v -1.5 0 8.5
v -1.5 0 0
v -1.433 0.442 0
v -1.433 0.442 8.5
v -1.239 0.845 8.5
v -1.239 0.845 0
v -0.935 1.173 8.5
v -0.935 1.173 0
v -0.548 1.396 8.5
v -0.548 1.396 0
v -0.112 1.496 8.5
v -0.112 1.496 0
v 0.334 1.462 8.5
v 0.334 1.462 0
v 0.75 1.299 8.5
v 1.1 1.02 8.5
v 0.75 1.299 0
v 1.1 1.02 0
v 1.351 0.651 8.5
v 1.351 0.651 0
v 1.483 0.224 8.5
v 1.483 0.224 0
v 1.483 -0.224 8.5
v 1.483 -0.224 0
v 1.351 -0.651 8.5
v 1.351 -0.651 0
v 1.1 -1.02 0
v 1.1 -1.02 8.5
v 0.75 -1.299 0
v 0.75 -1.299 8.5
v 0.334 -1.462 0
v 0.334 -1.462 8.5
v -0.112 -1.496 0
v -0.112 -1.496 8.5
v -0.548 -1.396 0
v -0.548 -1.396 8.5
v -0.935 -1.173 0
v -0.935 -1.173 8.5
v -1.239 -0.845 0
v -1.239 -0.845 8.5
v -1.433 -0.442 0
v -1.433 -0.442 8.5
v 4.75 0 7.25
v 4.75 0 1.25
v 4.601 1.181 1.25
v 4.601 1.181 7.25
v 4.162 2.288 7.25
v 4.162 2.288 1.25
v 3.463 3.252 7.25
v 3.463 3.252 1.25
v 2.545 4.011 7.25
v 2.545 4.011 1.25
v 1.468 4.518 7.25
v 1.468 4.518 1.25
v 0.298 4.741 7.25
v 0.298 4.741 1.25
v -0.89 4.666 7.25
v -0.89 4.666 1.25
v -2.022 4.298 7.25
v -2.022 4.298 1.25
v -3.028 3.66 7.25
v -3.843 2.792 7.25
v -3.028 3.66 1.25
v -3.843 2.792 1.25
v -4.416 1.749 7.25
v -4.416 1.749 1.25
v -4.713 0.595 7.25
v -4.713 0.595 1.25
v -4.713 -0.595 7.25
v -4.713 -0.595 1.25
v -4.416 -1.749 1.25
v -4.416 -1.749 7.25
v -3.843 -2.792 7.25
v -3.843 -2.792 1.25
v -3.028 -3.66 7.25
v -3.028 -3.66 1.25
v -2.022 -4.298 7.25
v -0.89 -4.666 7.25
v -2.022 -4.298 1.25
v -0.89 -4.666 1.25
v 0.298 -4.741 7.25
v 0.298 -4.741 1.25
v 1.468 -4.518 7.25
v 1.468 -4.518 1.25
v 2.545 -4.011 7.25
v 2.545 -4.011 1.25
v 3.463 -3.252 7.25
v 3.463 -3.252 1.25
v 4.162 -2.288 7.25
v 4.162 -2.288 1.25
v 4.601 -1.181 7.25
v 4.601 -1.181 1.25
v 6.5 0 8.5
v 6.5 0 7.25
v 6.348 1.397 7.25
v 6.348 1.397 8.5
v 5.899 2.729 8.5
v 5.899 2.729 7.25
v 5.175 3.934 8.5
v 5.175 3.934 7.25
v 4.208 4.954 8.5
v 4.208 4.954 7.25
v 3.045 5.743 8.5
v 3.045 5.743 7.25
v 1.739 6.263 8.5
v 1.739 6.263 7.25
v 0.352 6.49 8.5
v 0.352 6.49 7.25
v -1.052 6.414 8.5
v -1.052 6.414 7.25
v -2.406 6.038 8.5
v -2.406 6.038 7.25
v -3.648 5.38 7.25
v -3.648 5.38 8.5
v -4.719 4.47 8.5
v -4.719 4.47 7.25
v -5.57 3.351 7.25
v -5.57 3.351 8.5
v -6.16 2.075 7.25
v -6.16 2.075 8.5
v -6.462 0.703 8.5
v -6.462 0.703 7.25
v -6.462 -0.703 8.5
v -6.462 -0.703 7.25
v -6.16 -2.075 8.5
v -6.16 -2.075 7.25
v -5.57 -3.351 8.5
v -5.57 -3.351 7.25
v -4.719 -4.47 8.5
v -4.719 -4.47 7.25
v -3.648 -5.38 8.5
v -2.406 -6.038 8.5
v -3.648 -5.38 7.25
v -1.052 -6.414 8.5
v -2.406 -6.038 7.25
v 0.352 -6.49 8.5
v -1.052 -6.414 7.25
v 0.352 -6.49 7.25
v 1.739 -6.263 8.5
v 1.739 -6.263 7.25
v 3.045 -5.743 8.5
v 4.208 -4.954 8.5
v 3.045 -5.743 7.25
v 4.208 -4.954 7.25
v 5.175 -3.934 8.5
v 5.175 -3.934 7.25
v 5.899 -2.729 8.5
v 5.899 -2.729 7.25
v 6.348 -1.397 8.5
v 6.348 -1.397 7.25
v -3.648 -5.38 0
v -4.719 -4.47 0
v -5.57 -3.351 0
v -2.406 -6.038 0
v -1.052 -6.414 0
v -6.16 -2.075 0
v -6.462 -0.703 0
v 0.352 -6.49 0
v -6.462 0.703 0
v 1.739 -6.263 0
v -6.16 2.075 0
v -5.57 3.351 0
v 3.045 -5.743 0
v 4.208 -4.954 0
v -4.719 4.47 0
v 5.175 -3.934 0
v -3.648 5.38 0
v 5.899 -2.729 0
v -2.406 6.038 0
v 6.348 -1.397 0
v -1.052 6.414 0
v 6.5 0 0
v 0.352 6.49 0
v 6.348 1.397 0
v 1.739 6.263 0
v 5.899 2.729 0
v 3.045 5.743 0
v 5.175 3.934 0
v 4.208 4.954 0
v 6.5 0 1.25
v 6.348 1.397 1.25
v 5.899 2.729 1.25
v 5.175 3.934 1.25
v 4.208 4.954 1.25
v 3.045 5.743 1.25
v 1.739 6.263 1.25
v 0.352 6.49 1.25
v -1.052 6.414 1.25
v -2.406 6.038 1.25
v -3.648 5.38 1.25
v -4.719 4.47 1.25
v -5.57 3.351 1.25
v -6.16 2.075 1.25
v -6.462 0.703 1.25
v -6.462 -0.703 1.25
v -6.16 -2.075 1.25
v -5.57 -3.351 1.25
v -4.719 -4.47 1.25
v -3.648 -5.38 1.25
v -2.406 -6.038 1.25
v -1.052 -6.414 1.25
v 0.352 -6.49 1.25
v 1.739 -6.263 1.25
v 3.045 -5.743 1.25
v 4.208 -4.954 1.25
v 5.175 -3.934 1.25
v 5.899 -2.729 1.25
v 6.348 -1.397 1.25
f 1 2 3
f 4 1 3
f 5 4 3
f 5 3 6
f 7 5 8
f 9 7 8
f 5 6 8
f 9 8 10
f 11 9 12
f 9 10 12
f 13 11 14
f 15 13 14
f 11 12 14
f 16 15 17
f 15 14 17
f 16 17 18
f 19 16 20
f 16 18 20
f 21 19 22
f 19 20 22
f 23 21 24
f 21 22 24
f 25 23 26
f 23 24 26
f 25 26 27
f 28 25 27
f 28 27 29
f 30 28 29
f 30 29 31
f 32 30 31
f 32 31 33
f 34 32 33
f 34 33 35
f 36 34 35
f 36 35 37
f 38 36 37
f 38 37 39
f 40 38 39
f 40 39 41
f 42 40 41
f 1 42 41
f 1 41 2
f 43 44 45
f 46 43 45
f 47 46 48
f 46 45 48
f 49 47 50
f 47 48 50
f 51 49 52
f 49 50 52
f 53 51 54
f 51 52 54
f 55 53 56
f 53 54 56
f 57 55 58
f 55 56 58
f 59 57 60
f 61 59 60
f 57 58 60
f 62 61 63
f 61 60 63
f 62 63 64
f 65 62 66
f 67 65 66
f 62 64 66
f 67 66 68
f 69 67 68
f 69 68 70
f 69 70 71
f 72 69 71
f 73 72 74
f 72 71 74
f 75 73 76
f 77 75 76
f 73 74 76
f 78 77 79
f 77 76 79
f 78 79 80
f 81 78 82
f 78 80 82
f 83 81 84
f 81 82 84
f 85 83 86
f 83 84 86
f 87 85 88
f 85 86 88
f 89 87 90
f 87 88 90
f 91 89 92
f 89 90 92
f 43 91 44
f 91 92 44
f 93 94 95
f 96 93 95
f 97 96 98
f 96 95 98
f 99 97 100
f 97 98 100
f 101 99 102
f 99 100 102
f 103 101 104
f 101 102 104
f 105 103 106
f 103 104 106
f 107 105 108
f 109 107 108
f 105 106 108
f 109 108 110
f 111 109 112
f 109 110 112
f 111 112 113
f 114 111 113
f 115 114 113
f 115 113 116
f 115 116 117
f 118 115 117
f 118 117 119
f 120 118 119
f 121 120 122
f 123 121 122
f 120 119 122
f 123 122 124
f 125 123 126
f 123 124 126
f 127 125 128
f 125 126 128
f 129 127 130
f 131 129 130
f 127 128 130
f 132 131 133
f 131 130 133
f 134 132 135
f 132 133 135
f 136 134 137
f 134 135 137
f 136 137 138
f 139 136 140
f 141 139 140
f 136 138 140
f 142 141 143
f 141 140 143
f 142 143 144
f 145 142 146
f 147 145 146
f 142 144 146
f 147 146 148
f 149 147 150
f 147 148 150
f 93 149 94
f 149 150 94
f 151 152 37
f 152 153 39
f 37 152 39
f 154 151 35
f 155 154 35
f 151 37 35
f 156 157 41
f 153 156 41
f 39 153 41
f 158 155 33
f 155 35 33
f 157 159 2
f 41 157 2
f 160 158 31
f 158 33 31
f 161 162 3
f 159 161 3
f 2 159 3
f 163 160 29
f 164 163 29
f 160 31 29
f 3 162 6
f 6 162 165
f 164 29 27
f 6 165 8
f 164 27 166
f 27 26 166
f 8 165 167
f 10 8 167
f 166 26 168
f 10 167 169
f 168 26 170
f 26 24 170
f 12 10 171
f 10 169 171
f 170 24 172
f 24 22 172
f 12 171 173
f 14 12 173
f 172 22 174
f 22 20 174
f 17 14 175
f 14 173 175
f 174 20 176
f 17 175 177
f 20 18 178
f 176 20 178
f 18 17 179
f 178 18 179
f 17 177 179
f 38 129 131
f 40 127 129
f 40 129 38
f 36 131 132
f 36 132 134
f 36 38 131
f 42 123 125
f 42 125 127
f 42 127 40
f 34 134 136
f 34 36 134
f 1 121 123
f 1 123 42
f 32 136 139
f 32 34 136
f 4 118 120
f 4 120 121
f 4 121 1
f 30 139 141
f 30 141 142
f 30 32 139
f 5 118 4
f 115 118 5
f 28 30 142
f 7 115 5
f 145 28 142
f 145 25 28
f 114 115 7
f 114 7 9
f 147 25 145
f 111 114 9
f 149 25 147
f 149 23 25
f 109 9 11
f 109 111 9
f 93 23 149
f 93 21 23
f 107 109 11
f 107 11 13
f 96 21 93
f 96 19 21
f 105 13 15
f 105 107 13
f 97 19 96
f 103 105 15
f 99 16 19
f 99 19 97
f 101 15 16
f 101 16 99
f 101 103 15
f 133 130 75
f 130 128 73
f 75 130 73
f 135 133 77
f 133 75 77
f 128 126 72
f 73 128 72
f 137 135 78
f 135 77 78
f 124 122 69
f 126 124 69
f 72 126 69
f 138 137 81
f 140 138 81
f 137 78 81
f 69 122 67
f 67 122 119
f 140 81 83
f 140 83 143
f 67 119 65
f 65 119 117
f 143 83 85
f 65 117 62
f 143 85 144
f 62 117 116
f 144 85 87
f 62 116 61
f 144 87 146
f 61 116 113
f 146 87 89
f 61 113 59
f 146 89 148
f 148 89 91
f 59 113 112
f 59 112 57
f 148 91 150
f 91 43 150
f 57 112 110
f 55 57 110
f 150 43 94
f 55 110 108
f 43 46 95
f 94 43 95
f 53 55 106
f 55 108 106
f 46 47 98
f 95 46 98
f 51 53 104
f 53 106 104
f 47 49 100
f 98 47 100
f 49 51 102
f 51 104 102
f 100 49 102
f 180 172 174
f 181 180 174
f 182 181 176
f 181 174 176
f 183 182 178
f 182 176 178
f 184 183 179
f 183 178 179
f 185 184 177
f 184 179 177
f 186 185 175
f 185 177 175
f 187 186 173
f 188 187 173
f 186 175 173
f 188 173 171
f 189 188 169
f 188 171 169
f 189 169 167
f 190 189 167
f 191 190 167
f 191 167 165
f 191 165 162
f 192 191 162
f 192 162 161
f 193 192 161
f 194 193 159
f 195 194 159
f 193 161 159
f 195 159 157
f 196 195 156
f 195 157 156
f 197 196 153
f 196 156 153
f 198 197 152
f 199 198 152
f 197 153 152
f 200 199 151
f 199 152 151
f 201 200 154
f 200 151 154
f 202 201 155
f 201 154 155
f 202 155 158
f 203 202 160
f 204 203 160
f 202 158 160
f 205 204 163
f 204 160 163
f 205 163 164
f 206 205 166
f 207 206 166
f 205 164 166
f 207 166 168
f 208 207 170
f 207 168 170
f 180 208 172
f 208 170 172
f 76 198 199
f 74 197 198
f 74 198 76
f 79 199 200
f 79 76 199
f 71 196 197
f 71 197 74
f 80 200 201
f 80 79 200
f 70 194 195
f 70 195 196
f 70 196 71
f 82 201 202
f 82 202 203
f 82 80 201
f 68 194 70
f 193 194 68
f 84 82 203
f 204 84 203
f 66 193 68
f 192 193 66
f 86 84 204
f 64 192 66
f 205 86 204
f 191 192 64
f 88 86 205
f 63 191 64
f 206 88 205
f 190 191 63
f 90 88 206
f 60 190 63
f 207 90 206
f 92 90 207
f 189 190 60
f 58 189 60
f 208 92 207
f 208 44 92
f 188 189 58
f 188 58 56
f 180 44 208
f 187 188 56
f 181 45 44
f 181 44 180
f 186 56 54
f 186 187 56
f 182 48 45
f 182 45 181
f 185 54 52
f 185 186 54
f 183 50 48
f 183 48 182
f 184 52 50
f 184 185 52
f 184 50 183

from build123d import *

# Parameters (mm, degrees)
SKETCH_1_R          = 6.5
EXTRUDE_1_DEPTH     = 1.25
SKETCH_2_R          = 4.75
EXTRUDE_2_DEPTH     = 6
SKETCH_3_R          = 6.5
EXTRUDE_3_DEPTH     = 1.25
SKETCH_4_R          = 1.5
CUT_EXTRUDE_1_DEPTH = 9.5


with BuildPart() as part:
    # 草图1 → 凸台-拉伸1 (new body)
    with BuildSketch(Plane.XY):
        Circle(SKETCH_1_R)
    extrude(amount=EXTRUDE_1_DEPTH)

    # 草图2 → 凸台-拉伸2 (add)
    with BuildSketch(Plane.XY.offset(1.25)):
        Circle(SKETCH_2_R)
    extrude(amount=EXTRUDE_2_DEPTH)

    # 草图3 → 凸台-拉伸3 (add)
    with BuildSketch(Plane.XY.offset(7.25)):
        Circle(SKETCH_3_R)
    extrude(amount=EXTRUDE_3_DEPTH)

    # 草图4 → 切除-拉伸1 (cut, through all)
    with BuildSketch(Plane(origin=(0, 0, 0), x_dir=(-1, 0, 0), z_dir=(0, 0, -1))):
        Circle(SKETCH_4_R)
    extrude(amount=-CUT_EXTRUDE_1_DEPTH, mode=Mode.SUBTRACT)


solid = part.part
